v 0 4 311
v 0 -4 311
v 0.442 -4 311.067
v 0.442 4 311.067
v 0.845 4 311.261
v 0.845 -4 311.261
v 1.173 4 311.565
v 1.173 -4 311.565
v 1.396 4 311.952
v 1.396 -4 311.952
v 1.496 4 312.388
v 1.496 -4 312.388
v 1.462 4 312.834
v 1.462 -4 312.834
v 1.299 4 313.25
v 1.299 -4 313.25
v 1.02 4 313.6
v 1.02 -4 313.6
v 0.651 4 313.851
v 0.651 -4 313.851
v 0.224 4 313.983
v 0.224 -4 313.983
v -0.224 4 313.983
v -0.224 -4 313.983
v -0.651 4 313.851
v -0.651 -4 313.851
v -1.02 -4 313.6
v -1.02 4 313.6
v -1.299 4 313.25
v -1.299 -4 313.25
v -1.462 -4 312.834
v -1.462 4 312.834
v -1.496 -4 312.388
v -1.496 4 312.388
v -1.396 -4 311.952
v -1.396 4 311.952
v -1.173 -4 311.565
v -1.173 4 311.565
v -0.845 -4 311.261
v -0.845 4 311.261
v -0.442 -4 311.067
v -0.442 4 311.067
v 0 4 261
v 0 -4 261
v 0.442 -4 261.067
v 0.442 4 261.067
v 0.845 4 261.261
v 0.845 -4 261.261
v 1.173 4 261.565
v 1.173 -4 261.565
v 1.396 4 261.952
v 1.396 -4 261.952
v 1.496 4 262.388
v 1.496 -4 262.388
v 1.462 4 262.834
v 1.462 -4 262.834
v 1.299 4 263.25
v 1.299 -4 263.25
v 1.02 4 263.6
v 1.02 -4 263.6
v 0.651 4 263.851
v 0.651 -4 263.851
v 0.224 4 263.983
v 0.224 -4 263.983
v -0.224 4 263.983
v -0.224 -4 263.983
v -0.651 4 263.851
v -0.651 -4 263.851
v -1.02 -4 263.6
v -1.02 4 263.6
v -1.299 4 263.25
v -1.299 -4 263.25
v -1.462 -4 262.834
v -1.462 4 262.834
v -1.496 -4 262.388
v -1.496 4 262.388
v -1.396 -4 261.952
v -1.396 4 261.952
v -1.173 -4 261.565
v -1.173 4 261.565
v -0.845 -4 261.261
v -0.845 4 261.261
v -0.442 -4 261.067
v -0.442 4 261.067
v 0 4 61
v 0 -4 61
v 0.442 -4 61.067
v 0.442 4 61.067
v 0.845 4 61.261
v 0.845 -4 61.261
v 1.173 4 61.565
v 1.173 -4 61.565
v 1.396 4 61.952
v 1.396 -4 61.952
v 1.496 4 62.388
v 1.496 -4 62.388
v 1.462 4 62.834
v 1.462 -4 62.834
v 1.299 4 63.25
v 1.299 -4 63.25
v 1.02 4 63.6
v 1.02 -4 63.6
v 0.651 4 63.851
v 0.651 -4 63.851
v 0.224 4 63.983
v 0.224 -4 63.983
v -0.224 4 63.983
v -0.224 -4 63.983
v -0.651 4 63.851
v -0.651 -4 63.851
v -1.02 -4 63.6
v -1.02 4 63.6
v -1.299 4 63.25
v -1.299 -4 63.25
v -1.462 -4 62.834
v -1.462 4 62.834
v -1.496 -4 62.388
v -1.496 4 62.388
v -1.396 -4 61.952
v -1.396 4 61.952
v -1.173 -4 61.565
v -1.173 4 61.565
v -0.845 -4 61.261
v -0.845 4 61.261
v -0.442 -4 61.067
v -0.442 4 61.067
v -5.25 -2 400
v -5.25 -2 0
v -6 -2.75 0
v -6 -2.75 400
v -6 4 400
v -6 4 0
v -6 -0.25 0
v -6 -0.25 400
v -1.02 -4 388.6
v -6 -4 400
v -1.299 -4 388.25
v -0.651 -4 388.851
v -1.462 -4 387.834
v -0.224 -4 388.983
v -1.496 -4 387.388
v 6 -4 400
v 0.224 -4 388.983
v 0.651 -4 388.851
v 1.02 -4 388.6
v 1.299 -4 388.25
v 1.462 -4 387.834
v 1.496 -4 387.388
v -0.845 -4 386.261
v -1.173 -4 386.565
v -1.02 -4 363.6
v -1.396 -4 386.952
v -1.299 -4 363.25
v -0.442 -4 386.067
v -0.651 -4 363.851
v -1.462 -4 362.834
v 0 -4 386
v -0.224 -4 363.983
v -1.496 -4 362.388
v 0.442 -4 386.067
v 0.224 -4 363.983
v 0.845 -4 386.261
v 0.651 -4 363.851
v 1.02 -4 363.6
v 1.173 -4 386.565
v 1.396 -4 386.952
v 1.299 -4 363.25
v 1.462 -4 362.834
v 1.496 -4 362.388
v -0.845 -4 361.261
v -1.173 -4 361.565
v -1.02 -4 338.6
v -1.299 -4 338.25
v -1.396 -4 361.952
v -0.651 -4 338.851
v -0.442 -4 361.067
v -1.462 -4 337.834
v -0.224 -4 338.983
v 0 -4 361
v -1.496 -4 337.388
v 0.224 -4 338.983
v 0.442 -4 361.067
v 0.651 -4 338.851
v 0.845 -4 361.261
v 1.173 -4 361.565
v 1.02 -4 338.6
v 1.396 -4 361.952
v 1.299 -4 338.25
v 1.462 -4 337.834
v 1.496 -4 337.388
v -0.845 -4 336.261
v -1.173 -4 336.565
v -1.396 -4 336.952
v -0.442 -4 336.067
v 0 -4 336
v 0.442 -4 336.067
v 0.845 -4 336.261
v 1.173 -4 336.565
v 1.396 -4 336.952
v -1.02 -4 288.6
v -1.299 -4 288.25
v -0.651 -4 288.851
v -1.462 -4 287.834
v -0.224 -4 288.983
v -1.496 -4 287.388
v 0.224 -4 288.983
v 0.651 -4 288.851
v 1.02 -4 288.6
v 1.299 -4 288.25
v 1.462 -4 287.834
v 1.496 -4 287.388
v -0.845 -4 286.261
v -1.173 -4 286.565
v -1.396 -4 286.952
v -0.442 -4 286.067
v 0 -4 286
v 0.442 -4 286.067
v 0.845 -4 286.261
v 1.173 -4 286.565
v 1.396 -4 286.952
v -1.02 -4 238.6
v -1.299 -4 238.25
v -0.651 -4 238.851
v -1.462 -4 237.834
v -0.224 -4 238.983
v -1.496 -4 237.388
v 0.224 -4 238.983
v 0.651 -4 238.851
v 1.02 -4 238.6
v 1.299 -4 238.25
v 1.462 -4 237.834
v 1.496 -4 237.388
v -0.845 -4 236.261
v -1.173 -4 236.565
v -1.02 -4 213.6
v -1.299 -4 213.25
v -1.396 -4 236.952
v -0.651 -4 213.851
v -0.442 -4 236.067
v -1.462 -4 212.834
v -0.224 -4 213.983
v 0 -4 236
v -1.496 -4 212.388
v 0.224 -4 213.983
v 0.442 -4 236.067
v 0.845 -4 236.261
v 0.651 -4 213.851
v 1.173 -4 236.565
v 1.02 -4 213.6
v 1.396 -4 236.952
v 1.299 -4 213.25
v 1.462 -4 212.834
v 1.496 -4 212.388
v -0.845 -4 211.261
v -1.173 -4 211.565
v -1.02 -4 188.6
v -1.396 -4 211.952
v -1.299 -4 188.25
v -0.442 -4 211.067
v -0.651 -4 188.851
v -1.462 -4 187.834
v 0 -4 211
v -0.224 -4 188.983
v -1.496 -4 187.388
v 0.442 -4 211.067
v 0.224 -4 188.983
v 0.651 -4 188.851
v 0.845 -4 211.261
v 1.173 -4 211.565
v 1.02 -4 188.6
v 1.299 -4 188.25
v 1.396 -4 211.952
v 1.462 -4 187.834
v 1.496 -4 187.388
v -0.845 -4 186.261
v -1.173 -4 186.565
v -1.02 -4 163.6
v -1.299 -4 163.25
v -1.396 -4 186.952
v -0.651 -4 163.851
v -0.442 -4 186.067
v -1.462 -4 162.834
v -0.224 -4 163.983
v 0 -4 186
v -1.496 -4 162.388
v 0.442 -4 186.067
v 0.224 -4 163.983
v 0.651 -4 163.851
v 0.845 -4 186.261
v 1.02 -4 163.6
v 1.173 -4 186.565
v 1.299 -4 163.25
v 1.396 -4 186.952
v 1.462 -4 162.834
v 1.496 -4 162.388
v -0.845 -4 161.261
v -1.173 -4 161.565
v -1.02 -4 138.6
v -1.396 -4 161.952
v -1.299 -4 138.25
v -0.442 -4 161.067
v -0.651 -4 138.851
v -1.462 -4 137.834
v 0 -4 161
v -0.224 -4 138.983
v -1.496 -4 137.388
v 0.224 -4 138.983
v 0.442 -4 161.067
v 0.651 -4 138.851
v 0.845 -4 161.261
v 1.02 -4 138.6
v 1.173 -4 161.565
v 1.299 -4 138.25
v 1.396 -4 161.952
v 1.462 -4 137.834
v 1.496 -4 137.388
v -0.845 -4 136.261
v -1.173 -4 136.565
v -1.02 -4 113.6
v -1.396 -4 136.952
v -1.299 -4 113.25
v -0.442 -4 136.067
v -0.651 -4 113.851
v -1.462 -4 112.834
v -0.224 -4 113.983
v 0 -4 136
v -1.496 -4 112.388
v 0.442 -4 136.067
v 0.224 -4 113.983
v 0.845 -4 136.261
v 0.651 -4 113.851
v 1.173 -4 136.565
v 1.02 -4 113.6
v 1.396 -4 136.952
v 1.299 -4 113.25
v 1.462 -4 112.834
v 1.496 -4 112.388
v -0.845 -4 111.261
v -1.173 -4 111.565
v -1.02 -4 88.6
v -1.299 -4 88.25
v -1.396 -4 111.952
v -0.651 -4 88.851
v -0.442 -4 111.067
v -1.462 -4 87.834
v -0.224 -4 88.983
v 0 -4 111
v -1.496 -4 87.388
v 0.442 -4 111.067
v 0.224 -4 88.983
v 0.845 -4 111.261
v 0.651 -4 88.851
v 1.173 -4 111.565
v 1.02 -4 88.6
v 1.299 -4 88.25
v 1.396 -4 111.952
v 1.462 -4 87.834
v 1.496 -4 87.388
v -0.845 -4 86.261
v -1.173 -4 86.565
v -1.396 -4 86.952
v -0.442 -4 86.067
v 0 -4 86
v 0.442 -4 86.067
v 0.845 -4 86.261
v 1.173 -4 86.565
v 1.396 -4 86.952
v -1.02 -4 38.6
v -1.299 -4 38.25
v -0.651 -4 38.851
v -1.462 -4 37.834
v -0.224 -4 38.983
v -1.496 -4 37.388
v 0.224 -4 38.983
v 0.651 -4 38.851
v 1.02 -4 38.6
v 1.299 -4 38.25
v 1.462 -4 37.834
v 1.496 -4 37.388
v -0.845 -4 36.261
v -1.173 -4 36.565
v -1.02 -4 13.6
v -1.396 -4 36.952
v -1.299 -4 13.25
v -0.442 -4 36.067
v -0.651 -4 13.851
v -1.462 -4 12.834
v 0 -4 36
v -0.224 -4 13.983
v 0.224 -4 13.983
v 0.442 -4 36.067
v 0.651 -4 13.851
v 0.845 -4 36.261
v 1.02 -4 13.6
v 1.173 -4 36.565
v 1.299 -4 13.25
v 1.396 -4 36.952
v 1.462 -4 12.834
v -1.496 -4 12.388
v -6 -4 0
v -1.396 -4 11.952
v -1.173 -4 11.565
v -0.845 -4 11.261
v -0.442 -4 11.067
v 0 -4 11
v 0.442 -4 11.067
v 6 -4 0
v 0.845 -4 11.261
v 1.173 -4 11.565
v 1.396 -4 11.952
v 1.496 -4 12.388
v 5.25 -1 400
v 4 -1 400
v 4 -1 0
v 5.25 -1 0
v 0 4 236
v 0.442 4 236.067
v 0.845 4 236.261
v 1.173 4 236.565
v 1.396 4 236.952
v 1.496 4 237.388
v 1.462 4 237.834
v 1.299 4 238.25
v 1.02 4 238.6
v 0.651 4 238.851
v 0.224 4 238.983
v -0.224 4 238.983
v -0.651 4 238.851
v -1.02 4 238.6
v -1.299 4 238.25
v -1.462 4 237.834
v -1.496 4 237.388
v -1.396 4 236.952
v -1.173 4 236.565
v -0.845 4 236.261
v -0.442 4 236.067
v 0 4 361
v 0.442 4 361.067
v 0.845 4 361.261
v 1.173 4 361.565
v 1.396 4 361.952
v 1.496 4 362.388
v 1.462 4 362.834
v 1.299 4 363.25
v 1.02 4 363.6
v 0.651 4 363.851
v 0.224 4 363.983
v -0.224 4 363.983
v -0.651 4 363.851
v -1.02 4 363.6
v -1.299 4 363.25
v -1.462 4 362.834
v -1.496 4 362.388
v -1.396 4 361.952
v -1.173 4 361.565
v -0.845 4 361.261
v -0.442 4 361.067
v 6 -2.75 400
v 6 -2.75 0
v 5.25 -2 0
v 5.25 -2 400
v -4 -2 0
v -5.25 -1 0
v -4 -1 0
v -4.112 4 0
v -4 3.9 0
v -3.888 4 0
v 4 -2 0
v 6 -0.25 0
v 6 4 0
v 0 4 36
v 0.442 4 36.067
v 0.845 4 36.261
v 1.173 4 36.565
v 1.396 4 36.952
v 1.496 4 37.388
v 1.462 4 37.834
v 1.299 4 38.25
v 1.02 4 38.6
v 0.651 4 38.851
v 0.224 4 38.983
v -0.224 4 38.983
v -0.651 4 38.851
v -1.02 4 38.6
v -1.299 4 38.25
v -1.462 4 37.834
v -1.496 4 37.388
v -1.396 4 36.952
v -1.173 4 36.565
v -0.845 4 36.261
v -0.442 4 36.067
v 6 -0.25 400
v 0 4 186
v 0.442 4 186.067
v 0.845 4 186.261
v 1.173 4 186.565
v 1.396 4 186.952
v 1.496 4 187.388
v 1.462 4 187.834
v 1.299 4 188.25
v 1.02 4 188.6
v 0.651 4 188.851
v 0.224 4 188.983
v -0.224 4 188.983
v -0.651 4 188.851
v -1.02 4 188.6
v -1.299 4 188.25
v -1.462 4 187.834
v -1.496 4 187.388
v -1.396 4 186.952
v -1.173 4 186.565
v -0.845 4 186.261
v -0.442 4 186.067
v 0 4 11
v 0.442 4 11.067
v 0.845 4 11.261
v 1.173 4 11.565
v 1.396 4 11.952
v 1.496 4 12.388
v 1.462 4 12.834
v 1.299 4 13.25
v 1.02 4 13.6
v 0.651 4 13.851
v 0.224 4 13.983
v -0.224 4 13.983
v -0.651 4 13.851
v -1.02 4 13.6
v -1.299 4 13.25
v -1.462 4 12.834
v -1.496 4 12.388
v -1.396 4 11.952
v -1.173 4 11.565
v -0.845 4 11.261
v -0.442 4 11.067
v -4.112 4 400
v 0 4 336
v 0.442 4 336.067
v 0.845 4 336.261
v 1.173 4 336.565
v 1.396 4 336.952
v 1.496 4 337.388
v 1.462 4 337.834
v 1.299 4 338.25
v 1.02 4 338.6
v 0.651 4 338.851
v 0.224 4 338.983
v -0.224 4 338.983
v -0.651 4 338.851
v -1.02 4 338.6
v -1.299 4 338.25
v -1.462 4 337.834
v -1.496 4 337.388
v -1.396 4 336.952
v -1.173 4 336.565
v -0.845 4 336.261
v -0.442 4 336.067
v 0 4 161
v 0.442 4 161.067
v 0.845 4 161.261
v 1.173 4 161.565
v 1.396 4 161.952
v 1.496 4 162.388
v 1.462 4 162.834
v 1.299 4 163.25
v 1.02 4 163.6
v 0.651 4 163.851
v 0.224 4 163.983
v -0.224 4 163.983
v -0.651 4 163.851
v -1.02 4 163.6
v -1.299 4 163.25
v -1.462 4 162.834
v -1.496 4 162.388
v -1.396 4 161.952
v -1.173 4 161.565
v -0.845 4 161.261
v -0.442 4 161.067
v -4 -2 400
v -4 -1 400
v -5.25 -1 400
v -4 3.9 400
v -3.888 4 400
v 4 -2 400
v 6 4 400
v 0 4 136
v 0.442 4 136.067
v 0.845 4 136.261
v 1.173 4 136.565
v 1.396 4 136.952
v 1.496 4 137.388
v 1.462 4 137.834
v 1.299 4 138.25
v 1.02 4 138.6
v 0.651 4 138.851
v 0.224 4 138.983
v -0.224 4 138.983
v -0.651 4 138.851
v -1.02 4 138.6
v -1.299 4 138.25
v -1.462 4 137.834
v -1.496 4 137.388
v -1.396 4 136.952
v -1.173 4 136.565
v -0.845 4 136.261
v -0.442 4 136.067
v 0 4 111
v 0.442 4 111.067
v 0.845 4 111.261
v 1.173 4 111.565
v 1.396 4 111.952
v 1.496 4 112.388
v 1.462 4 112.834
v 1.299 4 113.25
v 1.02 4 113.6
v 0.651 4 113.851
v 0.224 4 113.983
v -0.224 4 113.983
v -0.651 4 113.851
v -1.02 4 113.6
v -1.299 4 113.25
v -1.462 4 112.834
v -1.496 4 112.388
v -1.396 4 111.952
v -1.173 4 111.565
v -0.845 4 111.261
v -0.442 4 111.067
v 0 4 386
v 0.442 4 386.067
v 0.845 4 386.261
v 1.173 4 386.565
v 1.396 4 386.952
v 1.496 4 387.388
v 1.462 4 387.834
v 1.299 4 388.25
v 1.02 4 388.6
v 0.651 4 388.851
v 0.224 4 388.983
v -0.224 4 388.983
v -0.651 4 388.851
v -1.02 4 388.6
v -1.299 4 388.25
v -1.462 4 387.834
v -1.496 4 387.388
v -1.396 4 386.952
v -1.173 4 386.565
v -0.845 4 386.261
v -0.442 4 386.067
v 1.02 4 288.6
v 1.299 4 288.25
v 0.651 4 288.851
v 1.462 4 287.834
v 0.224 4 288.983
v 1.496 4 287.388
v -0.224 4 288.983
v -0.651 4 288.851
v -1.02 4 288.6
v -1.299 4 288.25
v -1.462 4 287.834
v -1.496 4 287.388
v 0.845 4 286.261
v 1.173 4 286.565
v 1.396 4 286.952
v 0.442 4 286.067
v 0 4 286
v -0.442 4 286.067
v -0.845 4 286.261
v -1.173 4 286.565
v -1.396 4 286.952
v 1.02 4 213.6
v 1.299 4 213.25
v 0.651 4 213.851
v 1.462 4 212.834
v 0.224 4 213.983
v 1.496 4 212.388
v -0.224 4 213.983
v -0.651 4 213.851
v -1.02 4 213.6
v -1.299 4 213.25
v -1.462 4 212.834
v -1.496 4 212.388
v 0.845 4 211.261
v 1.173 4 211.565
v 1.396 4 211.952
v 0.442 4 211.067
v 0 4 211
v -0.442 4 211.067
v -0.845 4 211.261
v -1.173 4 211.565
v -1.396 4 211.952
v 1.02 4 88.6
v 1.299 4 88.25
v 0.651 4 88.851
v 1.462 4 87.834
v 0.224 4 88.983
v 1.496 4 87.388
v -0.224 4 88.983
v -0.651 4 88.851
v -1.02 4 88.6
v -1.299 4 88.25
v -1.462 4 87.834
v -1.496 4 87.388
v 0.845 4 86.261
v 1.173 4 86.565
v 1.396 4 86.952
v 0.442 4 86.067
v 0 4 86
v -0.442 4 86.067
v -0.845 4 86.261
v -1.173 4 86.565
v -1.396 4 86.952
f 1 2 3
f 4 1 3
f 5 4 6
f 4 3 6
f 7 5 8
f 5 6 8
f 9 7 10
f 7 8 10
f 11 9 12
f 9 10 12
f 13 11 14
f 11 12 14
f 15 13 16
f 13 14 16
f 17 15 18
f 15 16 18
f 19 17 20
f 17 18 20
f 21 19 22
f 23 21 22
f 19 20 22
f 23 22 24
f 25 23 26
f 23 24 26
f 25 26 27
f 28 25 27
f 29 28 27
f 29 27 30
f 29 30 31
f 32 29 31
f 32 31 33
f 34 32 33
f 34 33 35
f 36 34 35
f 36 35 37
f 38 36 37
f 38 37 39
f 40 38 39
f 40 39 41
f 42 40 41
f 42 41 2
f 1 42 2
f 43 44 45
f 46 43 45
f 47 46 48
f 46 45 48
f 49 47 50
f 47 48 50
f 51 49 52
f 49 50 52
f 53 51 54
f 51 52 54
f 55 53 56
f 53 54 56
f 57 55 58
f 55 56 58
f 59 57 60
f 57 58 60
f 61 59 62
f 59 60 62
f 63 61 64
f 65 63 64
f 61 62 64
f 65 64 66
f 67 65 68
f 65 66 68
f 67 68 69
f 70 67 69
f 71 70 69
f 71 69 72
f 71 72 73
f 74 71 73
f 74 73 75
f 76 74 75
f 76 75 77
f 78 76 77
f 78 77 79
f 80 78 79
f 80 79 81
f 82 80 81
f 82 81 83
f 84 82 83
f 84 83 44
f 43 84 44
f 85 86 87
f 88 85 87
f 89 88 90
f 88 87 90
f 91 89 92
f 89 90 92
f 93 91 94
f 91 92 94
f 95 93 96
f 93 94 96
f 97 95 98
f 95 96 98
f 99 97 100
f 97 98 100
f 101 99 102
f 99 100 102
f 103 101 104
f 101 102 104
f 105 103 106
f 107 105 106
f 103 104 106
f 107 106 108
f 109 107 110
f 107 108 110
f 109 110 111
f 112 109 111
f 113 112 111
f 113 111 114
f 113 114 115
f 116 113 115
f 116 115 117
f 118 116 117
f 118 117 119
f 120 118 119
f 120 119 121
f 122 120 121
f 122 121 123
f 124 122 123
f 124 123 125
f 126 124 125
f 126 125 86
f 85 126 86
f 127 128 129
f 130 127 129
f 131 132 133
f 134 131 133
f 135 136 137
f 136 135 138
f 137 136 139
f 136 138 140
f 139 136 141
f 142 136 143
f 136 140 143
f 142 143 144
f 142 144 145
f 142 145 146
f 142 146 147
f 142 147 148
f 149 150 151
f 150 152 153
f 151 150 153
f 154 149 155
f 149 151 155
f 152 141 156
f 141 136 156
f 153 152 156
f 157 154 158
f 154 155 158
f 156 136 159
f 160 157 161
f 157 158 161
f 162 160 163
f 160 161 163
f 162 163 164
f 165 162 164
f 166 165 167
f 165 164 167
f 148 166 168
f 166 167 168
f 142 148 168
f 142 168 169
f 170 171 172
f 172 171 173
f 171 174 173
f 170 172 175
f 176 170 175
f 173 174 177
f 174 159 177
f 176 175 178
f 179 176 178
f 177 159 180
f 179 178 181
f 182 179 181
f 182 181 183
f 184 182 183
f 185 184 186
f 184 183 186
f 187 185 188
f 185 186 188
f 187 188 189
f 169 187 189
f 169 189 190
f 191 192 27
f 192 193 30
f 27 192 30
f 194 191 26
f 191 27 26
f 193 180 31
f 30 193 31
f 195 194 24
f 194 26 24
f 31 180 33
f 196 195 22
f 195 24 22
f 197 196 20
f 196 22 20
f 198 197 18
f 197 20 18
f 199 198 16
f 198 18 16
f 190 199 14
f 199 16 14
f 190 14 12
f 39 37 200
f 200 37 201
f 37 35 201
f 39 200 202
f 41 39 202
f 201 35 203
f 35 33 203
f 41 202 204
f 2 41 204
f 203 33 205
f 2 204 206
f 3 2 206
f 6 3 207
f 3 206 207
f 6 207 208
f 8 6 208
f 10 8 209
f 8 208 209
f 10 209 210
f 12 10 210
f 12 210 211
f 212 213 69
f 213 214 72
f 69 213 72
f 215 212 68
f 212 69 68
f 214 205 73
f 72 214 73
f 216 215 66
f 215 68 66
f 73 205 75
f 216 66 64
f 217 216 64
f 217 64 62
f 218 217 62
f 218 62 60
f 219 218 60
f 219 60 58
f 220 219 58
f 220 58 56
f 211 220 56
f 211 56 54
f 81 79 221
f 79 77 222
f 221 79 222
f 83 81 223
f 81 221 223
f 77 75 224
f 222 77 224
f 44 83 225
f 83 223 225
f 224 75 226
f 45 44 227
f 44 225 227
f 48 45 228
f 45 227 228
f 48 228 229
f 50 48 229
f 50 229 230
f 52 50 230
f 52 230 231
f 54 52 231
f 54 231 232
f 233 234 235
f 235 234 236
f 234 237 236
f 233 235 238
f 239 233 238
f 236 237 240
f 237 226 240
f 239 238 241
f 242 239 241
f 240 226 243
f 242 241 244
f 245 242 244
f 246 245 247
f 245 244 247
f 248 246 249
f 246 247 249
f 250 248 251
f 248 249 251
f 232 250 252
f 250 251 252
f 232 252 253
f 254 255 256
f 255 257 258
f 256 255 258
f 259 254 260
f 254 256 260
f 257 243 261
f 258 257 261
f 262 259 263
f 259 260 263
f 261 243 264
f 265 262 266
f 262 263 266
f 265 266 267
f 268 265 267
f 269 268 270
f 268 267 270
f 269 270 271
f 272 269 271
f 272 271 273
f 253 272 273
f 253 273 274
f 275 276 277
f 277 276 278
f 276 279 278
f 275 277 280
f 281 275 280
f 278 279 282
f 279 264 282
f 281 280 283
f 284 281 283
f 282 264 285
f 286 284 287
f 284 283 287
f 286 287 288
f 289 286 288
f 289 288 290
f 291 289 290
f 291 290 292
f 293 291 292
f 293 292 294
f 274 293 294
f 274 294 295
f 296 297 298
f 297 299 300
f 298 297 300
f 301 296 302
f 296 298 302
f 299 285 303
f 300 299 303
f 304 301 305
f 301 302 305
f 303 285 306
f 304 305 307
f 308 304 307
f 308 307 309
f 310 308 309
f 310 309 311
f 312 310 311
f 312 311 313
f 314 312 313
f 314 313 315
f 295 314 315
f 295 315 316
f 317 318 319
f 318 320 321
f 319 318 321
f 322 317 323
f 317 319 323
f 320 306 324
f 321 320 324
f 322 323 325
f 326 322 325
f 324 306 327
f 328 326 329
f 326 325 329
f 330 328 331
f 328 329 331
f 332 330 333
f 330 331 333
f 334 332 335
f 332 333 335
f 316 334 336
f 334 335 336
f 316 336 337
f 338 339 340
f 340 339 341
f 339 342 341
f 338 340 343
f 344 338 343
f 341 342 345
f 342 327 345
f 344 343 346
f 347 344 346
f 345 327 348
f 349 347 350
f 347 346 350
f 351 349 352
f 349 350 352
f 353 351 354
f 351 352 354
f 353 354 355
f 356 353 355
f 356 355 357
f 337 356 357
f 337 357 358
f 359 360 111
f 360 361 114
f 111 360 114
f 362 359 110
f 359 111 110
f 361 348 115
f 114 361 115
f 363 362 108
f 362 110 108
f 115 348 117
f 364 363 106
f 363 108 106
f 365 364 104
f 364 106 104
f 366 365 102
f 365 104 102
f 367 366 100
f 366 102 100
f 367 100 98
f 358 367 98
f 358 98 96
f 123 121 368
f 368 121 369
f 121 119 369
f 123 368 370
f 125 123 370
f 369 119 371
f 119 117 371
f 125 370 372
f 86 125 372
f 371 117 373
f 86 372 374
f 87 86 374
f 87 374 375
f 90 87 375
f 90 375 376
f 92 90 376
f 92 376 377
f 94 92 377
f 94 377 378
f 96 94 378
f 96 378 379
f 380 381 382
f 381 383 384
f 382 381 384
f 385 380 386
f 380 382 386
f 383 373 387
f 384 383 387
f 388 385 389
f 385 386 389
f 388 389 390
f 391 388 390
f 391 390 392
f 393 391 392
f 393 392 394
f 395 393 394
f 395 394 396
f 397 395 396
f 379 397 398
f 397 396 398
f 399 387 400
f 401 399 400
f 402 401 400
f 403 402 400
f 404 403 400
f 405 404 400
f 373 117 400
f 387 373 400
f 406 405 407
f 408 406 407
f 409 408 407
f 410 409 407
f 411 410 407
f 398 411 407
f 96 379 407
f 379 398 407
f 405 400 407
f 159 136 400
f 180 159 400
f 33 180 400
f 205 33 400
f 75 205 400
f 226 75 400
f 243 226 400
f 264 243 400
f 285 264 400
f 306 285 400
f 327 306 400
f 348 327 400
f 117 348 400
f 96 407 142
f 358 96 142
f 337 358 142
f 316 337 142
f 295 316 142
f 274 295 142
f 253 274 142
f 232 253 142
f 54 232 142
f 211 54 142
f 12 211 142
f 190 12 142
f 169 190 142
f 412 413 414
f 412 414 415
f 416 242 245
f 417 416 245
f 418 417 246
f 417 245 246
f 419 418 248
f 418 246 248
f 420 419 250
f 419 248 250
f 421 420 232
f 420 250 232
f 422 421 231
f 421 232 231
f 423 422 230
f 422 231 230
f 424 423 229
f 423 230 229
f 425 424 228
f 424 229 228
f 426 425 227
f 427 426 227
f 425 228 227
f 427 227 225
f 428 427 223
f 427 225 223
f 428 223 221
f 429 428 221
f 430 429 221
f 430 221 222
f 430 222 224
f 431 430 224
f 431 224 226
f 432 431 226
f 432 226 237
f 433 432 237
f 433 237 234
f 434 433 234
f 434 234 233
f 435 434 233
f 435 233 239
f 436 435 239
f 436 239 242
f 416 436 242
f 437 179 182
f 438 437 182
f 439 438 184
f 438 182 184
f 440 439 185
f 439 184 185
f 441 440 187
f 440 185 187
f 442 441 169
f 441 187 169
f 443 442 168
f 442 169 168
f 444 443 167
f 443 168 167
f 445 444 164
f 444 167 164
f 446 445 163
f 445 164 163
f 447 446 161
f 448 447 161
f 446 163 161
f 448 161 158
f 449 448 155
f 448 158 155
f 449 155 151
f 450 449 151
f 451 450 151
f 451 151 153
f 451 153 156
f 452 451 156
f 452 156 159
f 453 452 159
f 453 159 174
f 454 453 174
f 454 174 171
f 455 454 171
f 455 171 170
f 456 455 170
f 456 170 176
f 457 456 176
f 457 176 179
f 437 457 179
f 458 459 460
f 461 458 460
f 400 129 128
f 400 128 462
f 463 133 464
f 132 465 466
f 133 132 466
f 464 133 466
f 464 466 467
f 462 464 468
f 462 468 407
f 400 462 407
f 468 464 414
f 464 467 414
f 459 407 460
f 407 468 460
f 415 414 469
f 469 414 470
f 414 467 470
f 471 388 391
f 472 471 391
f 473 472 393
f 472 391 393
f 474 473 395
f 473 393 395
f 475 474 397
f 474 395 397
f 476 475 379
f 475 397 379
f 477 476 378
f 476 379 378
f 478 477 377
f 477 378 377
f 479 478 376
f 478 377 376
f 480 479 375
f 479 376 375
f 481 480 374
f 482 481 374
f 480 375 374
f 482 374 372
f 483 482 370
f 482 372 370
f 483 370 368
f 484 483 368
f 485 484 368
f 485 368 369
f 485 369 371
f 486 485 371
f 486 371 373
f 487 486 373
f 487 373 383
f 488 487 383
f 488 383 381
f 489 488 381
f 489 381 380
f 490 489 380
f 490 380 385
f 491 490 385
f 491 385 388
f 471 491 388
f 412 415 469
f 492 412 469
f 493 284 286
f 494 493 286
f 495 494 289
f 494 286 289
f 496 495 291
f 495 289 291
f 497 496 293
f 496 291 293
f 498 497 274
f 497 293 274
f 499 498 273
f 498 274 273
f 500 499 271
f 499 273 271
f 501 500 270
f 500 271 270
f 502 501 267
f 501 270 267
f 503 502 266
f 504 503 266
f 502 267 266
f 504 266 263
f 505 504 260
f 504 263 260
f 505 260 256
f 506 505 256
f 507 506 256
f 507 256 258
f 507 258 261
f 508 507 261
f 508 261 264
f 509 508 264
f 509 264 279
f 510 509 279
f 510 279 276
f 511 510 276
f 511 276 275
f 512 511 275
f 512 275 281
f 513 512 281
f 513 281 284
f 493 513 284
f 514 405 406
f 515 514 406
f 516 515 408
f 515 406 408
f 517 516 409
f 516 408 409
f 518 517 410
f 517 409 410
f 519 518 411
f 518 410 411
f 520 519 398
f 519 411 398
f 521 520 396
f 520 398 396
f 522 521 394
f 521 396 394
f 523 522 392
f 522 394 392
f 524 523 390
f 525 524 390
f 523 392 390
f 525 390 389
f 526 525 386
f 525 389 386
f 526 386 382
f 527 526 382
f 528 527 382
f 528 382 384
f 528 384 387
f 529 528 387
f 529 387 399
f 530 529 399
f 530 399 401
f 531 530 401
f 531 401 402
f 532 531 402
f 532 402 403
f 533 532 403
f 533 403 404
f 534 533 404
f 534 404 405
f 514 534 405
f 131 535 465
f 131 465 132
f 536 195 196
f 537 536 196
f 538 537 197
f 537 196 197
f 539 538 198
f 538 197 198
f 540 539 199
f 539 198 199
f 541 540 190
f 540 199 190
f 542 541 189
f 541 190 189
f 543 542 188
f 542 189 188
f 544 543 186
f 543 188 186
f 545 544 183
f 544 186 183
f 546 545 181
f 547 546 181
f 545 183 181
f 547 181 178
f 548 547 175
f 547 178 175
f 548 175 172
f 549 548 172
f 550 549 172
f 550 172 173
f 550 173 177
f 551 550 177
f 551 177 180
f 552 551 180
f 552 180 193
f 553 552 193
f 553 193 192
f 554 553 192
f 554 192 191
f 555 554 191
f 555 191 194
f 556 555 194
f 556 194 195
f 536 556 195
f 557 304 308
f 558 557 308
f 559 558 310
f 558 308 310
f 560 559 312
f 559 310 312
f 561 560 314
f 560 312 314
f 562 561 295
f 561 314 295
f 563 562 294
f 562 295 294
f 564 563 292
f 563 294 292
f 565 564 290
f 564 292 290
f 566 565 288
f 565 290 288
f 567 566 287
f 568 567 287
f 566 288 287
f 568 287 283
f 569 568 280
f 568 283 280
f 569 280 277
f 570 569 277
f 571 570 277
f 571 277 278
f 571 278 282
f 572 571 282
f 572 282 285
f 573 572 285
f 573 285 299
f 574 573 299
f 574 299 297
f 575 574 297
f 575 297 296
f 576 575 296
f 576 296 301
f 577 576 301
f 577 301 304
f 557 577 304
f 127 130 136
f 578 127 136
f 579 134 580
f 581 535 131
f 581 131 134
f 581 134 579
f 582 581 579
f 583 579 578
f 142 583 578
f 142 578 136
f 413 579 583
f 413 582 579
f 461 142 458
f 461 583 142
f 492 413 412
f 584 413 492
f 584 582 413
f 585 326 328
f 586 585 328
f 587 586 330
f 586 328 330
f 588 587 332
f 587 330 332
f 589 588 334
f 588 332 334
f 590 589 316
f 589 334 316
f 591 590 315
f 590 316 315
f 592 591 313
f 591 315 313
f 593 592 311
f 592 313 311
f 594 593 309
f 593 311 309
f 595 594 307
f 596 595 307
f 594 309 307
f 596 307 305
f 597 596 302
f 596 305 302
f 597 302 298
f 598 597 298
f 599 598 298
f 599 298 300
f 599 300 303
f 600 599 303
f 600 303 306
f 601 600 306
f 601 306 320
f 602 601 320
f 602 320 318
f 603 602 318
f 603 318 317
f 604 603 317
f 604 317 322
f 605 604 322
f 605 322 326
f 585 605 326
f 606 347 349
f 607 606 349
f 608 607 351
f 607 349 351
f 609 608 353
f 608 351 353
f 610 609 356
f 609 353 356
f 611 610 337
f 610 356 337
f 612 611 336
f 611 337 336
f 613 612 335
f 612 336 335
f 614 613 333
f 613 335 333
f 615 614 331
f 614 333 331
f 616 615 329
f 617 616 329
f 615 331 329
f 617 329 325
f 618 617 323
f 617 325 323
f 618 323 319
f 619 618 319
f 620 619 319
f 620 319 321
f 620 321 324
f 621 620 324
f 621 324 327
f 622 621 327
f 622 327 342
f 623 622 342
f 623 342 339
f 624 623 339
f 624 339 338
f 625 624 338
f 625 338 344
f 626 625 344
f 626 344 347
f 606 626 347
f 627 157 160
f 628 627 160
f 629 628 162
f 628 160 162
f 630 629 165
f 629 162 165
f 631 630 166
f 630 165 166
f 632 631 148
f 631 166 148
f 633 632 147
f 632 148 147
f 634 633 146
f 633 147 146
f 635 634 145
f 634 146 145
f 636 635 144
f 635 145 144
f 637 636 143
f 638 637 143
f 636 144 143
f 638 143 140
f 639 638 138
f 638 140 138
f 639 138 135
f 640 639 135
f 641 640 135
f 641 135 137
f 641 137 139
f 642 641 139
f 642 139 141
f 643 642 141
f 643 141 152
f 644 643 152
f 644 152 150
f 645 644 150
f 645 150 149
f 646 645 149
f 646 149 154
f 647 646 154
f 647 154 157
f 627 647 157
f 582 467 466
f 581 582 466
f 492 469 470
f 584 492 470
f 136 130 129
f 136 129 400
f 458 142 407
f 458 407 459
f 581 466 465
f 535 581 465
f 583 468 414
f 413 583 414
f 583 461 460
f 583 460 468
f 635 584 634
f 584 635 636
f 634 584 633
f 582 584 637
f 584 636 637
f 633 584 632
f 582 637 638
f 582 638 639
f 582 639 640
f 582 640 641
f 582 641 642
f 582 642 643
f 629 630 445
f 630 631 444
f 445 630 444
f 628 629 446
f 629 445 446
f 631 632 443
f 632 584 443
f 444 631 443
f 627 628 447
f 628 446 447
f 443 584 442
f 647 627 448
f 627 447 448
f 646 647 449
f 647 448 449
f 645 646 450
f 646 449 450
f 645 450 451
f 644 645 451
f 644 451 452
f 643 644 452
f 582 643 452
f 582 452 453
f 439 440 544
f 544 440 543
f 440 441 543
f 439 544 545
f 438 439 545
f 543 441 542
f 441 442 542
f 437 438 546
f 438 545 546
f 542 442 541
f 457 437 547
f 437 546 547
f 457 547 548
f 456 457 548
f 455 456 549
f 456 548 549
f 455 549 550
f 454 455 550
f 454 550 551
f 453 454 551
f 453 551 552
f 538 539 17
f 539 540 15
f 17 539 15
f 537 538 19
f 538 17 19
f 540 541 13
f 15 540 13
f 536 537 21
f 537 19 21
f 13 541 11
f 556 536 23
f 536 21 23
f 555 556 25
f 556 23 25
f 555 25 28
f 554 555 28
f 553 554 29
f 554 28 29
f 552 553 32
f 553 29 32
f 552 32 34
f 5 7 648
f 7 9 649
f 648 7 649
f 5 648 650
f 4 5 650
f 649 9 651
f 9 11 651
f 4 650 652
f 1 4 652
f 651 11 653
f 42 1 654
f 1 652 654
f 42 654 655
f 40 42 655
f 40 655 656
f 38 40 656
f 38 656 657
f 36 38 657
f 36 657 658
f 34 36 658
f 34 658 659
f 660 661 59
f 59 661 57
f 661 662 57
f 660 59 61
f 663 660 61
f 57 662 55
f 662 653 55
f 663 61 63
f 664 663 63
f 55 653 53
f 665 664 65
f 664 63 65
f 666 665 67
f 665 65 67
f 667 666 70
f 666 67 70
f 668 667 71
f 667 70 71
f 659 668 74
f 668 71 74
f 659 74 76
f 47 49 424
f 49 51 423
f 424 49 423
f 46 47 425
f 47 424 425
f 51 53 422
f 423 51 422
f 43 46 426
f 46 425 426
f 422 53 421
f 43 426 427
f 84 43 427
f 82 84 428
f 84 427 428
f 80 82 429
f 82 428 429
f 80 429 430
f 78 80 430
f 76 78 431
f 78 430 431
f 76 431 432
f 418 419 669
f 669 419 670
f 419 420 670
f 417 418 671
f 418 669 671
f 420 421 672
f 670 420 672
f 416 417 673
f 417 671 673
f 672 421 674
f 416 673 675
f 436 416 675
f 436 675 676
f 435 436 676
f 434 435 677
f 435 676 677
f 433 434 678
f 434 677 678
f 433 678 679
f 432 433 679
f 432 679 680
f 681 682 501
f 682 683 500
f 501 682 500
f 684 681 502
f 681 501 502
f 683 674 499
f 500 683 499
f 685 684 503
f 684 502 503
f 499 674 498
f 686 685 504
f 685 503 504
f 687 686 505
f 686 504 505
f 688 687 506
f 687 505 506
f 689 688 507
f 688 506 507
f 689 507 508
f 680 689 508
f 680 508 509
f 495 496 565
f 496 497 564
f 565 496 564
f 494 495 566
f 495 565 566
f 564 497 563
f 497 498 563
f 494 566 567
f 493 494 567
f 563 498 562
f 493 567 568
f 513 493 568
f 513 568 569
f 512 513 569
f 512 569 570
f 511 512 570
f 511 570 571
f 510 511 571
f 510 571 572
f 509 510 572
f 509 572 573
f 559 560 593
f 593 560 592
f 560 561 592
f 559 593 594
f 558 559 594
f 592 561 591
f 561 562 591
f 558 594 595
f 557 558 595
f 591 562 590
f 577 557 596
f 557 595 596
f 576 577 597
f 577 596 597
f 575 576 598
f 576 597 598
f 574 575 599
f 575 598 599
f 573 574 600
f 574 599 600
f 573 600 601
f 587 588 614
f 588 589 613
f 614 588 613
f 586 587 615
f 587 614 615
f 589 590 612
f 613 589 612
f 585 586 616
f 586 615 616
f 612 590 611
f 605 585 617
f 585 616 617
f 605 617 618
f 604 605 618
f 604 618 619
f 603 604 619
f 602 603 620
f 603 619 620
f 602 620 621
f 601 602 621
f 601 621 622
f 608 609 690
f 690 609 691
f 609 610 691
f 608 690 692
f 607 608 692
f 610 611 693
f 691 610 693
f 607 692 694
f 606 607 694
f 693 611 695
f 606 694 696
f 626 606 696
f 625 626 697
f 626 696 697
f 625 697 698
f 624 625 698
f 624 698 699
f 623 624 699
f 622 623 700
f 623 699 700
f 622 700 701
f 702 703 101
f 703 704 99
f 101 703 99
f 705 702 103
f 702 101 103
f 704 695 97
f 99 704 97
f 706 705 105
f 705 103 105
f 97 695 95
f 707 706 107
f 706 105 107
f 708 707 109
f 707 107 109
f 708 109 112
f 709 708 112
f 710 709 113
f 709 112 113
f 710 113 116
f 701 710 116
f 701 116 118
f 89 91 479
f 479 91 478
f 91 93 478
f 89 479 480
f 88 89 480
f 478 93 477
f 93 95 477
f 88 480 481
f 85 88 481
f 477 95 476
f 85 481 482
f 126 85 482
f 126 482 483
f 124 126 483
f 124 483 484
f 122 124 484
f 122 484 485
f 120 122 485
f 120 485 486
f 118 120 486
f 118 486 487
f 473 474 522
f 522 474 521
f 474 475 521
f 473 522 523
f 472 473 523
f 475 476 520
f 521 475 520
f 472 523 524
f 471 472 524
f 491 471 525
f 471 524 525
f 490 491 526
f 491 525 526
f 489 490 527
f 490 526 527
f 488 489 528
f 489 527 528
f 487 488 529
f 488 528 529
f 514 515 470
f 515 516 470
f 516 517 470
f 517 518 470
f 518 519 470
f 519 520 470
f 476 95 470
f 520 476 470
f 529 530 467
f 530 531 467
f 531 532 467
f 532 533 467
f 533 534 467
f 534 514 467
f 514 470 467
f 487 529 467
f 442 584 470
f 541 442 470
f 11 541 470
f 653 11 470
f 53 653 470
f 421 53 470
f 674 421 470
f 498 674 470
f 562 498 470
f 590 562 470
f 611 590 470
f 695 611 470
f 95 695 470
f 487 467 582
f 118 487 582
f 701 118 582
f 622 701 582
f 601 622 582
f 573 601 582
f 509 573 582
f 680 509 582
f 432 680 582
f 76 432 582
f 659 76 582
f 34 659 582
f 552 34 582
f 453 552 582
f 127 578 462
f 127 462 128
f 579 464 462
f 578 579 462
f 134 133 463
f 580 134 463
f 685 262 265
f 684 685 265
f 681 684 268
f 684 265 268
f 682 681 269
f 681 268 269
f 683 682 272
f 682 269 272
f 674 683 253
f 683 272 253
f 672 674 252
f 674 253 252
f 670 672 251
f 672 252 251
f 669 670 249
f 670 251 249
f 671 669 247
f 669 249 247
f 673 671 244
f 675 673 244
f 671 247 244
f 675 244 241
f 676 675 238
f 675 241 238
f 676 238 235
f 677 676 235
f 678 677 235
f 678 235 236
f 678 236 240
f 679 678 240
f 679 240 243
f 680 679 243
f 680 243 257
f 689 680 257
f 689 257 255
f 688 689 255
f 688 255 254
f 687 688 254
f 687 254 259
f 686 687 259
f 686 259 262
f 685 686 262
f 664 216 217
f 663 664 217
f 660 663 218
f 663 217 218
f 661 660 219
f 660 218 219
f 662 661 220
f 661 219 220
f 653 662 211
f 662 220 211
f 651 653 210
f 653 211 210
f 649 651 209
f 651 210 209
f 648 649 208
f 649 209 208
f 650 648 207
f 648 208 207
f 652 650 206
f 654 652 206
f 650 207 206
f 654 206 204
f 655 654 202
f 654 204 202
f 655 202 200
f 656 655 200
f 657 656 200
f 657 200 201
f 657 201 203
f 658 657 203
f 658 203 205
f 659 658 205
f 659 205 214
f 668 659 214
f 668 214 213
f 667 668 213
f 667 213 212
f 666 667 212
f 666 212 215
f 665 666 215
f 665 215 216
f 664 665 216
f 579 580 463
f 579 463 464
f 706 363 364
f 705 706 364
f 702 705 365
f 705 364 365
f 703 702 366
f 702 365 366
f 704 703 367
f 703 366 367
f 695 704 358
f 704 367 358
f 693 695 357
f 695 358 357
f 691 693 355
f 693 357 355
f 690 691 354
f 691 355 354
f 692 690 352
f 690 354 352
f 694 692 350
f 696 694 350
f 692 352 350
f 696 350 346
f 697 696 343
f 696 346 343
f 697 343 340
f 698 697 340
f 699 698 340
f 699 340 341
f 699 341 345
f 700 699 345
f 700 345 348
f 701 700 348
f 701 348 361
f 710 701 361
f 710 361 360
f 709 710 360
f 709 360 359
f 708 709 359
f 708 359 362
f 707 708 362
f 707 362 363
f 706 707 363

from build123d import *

# Parameters (mm, degrees)
BOSS_EXTRUDE1_DEPTH = 400
SKETCH2_R           = 1.5
CUT_EXTRUDE1_DEPTH  = 10
LPATTERN1_COUNT     = 16
LPATTERN1_PITCH     = 25


with BuildPart() as part:
    # Sketch1 → Boss-Extrude1 (new body)
    with BuildSketch(Plane.XY):
        Polygon((-6, -2.75), (-6, -4), (6, -4), (6, -2.75), (5.25, -2), (4, -2), (4, -1), (5.25, -1), (6, -0.25), (6, 4), (-3.888196601, 4), (-4, 3.9), (-4.111803399, 4), (-6, 4), (-6, -0.25), (-5.25, -1), (-4, -1), (-4, -2), (-5.25, -2), align=None)
    extrude(amount=BOSS_EXTRUDE1_DEPTH)

    # Sketch2 → Cut-Extrude1 (cut)
    with BuildSketch(Plane.XZ.offset(4)):
        with Locations(Location((0, 12.5, 0), (0, 0, 270))):
            Circle(SKETCH2_R)
    cut_extrude1 = extrude(amount=-CUT_EXTRUDE1_DEPTH, mode=Mode.SUBTRACT)

    # LPattern1: Cut-Extrude1 ×16
    with Locations(*[(0, 0, i * LPATTERN1_PITCH) for i in range(1, LPATTERN1_COUNT)]):
        add(cut_extrude1, mode=Mode.SUBTRACT)


solid = part.part
